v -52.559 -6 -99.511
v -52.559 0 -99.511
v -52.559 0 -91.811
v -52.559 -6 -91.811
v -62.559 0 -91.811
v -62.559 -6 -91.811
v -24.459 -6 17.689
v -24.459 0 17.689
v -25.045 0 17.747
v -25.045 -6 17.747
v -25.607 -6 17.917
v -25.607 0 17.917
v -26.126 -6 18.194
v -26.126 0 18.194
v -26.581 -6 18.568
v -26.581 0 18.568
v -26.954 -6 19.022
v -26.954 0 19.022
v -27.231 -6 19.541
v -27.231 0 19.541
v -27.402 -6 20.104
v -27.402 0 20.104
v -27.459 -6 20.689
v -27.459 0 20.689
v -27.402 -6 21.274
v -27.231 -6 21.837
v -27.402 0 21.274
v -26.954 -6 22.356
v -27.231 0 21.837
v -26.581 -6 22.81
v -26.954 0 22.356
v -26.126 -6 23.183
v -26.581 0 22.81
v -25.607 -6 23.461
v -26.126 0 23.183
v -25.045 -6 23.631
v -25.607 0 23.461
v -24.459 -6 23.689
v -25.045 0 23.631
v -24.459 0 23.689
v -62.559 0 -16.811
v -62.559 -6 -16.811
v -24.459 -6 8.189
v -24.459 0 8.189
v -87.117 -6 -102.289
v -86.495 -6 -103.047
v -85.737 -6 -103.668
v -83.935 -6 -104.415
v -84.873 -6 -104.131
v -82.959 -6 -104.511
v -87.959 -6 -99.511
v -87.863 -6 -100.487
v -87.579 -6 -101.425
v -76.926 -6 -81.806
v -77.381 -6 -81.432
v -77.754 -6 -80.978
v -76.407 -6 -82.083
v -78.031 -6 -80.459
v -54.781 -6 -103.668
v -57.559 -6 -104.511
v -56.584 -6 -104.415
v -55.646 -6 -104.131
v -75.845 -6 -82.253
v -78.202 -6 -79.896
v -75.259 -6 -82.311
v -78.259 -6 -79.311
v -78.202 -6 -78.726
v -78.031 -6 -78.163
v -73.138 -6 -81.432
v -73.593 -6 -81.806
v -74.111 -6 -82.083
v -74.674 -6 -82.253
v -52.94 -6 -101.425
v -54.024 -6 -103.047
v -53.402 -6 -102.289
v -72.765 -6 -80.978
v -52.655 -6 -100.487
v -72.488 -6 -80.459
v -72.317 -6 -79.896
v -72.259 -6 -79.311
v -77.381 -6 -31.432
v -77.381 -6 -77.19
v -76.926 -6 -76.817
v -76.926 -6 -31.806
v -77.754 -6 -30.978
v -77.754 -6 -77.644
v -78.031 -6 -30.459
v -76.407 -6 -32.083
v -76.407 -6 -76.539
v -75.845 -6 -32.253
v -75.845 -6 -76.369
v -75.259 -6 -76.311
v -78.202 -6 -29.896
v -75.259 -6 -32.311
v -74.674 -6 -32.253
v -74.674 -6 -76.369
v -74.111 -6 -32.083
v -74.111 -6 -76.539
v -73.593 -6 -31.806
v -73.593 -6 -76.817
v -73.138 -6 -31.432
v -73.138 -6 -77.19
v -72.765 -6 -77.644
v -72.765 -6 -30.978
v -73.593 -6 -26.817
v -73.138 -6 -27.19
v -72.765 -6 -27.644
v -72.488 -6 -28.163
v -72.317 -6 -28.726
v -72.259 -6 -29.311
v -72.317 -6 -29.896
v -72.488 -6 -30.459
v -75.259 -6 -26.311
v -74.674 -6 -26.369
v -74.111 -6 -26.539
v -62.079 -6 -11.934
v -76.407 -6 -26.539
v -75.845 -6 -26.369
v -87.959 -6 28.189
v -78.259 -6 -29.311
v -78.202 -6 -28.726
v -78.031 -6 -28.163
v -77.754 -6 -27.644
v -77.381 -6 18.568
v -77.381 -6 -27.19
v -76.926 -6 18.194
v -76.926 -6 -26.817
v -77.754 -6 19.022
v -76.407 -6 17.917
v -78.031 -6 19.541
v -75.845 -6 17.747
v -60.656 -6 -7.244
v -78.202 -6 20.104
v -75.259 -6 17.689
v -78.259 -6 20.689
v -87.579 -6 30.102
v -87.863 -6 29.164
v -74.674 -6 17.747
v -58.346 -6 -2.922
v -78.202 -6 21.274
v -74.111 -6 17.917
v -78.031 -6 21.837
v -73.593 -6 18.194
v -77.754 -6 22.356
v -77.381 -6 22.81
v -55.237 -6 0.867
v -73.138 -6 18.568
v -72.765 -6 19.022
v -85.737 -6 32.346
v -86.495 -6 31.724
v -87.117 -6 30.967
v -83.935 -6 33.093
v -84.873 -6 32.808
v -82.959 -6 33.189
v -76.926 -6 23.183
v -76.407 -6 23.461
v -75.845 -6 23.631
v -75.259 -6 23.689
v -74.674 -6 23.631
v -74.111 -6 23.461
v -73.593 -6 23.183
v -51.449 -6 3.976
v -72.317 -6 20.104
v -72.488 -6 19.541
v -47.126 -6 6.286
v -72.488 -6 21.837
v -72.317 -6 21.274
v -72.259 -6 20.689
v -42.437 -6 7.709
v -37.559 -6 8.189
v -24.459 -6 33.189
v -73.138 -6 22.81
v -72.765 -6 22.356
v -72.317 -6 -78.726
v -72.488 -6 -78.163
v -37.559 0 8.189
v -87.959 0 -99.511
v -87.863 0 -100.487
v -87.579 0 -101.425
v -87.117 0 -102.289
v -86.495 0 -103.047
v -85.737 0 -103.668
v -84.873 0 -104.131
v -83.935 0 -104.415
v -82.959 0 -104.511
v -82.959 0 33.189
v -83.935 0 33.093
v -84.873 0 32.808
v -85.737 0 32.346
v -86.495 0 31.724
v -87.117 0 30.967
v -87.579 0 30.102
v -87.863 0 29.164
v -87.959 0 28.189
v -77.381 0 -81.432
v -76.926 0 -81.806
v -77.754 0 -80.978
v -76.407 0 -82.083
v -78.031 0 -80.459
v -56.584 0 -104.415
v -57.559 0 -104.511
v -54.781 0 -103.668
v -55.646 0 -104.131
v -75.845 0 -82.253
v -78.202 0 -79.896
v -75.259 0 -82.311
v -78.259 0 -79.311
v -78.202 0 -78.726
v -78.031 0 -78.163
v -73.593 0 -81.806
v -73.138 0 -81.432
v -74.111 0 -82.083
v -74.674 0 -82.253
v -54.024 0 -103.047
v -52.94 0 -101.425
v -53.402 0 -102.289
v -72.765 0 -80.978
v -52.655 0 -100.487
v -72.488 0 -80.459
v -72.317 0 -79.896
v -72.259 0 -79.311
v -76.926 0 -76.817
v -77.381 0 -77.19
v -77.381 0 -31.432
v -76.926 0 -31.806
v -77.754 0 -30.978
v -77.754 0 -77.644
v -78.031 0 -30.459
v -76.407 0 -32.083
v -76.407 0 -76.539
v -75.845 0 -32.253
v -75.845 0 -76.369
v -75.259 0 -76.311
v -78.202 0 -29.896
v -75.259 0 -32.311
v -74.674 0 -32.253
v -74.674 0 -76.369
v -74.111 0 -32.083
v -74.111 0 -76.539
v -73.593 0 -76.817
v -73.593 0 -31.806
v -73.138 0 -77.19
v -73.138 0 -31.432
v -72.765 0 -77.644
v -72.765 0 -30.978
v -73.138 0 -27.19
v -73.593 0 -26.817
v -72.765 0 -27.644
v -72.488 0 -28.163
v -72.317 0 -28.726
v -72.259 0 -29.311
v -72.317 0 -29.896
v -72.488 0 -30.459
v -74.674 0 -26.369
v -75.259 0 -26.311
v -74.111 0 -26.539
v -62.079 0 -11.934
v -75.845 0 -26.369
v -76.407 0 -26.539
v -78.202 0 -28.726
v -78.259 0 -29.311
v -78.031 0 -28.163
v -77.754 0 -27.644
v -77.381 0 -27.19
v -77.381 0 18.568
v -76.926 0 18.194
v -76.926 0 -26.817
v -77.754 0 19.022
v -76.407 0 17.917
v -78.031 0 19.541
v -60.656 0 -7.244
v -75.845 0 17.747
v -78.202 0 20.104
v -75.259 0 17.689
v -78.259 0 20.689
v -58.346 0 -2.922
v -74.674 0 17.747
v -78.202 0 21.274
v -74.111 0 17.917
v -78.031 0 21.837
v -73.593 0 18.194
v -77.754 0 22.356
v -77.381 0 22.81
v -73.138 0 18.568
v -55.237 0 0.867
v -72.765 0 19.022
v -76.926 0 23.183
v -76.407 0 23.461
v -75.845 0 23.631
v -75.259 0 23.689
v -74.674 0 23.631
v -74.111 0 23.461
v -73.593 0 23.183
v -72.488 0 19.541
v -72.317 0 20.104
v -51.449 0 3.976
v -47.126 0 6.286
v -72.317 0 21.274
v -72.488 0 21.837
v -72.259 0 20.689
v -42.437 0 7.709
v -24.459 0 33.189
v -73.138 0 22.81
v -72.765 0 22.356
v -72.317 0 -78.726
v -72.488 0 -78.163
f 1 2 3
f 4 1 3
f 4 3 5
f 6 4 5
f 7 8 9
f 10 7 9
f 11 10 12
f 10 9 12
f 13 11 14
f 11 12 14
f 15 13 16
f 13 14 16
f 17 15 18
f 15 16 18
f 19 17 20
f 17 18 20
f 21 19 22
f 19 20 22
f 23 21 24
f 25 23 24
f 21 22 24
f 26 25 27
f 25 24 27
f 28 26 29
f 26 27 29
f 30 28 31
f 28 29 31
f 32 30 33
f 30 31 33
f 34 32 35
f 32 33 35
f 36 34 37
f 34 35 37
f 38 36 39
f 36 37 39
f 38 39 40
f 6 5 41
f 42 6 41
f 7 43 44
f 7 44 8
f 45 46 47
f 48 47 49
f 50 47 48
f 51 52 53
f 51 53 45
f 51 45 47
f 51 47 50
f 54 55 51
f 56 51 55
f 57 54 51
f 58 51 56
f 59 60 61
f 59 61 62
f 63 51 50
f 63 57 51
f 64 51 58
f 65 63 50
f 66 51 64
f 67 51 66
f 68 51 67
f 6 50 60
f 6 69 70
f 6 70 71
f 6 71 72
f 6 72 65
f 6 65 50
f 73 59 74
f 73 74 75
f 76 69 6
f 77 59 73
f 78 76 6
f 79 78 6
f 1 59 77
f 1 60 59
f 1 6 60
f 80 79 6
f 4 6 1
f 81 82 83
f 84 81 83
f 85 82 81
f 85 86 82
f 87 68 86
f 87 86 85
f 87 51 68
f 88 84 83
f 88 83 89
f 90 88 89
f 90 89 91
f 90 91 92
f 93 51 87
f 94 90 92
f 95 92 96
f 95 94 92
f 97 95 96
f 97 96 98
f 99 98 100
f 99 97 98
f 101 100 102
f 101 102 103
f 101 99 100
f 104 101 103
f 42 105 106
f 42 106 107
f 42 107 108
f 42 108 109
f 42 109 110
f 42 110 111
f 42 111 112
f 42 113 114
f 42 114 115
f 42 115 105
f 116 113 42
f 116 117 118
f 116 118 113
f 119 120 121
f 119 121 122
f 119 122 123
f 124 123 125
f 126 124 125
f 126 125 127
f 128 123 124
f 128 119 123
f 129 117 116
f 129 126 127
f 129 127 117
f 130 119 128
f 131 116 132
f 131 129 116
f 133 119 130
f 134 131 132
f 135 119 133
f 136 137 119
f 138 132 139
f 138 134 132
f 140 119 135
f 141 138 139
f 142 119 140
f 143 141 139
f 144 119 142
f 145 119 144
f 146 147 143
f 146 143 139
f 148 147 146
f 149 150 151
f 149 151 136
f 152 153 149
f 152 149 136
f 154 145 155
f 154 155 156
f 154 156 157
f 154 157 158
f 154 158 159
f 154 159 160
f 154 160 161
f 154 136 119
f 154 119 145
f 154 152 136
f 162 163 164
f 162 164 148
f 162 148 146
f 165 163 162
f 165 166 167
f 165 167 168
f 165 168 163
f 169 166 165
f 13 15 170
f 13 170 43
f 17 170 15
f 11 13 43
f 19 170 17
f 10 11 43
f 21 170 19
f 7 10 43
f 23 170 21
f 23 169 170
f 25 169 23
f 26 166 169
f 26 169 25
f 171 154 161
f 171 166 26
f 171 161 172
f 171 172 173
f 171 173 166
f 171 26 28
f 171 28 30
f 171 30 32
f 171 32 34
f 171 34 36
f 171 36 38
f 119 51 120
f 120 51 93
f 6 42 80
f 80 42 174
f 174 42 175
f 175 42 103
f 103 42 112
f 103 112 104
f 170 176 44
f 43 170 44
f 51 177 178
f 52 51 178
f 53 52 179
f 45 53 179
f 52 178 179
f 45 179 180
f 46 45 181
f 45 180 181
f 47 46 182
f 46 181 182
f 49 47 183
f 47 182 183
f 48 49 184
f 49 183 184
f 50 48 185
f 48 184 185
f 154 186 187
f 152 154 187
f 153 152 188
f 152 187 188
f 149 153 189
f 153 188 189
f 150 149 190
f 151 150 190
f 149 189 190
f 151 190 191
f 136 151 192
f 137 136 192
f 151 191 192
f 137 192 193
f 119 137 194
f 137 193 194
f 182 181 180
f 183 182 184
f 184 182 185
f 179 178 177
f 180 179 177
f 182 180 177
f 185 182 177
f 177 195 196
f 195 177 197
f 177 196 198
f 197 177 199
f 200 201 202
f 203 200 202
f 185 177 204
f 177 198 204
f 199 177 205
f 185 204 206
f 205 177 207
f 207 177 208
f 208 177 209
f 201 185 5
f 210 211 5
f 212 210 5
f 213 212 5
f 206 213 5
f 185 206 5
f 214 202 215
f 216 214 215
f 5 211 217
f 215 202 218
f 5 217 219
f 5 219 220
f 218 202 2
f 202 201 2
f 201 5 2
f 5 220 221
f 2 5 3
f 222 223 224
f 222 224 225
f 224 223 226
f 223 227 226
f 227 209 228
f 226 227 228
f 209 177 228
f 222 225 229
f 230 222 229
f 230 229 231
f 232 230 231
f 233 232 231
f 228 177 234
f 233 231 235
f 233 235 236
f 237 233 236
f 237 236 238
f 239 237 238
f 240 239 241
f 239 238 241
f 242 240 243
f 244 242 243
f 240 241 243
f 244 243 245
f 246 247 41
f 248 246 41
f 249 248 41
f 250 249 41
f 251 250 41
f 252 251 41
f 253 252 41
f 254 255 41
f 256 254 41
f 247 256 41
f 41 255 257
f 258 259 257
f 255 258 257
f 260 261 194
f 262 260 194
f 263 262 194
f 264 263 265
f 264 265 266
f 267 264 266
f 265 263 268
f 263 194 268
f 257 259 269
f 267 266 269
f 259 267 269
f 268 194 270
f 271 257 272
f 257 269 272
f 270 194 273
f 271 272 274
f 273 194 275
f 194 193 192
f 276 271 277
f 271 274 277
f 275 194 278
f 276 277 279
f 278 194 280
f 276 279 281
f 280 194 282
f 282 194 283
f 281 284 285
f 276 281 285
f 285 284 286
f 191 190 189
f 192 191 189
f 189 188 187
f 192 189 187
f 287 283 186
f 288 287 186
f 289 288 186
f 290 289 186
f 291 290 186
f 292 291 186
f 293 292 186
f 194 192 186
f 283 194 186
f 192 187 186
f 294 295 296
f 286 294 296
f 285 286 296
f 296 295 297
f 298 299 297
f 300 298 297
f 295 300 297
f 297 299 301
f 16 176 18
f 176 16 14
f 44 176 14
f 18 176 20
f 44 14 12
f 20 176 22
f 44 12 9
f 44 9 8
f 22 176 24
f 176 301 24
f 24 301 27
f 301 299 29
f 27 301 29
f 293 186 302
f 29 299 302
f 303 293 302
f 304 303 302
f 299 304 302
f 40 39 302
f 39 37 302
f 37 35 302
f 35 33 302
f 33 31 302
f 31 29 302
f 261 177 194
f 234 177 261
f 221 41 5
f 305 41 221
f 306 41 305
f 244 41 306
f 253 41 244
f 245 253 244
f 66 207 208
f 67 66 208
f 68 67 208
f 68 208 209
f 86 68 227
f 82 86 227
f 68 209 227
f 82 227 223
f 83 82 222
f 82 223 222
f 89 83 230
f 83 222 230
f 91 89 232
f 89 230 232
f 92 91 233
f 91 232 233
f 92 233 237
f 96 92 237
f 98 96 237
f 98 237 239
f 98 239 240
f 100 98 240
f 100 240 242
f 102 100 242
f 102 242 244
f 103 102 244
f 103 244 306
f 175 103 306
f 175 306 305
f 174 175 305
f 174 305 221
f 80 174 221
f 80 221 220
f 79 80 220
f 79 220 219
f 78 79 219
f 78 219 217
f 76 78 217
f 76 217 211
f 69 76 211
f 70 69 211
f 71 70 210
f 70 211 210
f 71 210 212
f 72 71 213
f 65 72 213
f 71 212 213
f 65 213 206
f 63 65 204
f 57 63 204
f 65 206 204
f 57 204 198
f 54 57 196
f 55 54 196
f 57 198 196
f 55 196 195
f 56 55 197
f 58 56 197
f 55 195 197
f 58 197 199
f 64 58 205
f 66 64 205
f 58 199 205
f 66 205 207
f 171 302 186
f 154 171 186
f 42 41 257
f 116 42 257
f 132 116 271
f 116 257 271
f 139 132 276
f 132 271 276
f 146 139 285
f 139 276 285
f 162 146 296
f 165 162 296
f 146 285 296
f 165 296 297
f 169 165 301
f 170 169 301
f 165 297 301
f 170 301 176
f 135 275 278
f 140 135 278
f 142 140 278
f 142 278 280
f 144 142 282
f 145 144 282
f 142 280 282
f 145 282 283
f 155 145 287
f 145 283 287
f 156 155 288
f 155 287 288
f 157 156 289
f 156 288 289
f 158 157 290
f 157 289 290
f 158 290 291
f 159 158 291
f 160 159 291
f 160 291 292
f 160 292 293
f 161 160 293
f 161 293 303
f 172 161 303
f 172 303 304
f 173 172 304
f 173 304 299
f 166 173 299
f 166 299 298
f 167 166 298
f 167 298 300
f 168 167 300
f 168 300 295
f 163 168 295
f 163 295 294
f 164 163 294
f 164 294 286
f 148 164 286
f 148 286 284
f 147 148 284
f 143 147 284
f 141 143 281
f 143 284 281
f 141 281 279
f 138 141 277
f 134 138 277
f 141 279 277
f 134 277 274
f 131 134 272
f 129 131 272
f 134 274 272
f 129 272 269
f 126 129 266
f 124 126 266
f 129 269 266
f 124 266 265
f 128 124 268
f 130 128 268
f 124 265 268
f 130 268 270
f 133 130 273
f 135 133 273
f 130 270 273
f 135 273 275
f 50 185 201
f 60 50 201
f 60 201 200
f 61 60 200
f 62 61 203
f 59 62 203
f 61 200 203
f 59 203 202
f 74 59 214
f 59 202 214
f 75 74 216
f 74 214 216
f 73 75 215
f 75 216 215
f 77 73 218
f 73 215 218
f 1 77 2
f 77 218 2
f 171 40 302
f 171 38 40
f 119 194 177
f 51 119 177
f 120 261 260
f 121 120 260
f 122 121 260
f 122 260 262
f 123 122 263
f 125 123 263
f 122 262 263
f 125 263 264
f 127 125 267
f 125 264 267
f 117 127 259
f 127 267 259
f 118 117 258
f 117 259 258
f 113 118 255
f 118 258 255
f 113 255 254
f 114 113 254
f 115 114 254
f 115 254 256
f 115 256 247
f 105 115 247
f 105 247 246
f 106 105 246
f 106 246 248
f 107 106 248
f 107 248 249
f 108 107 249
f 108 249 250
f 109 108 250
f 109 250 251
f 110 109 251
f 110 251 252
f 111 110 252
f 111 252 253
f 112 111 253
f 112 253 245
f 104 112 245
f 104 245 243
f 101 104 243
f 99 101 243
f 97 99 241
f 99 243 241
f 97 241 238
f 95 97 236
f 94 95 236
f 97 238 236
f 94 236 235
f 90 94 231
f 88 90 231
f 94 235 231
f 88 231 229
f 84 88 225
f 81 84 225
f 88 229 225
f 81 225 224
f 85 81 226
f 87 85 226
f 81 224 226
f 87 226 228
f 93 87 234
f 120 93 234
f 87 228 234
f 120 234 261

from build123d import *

# Parameters (mm, degrees)
F1_DEPTH = 6
F3_D     = 6
F4_W     = 63.5
F4_H     = 140
F5_DEPTH = 25


with BuildPart() as f1:
    # F0 (on Front) → F1 (new body)
    with BuildSketch(Plane.XZ):
        with BuildLine():
            Line((34.0407285993, 33.1888695754), (-82.9592714007, 33.1888695754))
            ThreePointArc((-82.9592714007, 33.1888695754), (-86.4948053066, 31.7244034814), (-87.9592714007, 28.1888695754))
            Line((-87.9592714007, 28.1888695754), (-87.9592714007, -99.5111304246))
            ThreePointArc((-87.9592714007, -99.5111304246), (-86.4948053066, -103.0466643305), (-82.9592714007, -104.5111304246))
            Line((-82.9592714007, -104.5111304246), (-57.5592714007, -104.5111304246))
            ThreePointArc((-57.5592714007, -104.5111304246), (-54.0237374948, -103.0466643305), (-52.5592714007, -99.5111304246))
            Line((-52.5592714007, -99.5111304246), (-52.5592714007, -91.8111304246))
            Line((-52.5592714007, -91.8111304246), (-62.5592714007, -91.8111304246))
            Line((-62.5592714007, -91.8111304246), (-62.5592714007, -16.8111304246))
            ThreePointArc((-62.5592714007, -16.8111304246), (-55.2369409303, 0.8665391051), (-37.5592714007, 8.1888695754))
            Line((-37.5592714007, 8.1888695754), (-11.3592714007, 8.1888695754))
            ThreePointArc((-11.3592714007, 8.1888695754), (6.318398129, 0.8665391051), (13.6407285993, -16.8111304246))
            Line((13.6407285993, -16.8111304246), (13.6407285993, -91.8111304246))
            Line((13.6407285993, -91.8111304246), (3.6407285993, -91.8111304246))
            Line((3.6407285993, -91.8111304246), (3.6407285993, -99.5111304246))
            ThreePointArc((3.6407285993, -99.5111304246), (5.1051946934, -103.0466643305), (8.6407285993, -104.5111304246))
            Line((8.6407285993, -104.5111304246), (34.0407285993, -104.5111304246))
            ThreePointArc((34.0407285993, -104.5111304246), (37.5762625052, -103.0466643305), (39.0407285993, -99.5111304246))
            Line((39.0407285993, -99.5111304246), (39.0407285993, 28.1888695754))
            ThreePointArc((39.0407285993, 28.1888695754), (37.5762625052, 31.7244034814), (34.0407285993, 33.1888695754))
        make_face()
    extrude(amount=F1_DEPTH)

    # F3 (through all)
    with Locations(Plane.XZ.offset(6)):
        with Locations((-75.2592714007, 20.6888695754), (-75.2592714007, -29.3111304246), (-75.2592714007, -79.3111304246), (-24.4592714007, 20.6888695754), (26.3407285993, 20.6888695754), (26.3407285993, -29.3111304246), (26.3407285993, -79.3111304246)):
            Hole(F3_D / 2)

    # F4 (on face) → F5 (cut)
    with BuildSketch(Plane.XZ.offset(6)):
        with Locations((7.2907285993, -36.8111304246)):
            Rectangle(F4_W, F4_H)
    extrude(amount=-F5_DEPTH, mode=Mode.SUBTRACT)


solid = f1.part
